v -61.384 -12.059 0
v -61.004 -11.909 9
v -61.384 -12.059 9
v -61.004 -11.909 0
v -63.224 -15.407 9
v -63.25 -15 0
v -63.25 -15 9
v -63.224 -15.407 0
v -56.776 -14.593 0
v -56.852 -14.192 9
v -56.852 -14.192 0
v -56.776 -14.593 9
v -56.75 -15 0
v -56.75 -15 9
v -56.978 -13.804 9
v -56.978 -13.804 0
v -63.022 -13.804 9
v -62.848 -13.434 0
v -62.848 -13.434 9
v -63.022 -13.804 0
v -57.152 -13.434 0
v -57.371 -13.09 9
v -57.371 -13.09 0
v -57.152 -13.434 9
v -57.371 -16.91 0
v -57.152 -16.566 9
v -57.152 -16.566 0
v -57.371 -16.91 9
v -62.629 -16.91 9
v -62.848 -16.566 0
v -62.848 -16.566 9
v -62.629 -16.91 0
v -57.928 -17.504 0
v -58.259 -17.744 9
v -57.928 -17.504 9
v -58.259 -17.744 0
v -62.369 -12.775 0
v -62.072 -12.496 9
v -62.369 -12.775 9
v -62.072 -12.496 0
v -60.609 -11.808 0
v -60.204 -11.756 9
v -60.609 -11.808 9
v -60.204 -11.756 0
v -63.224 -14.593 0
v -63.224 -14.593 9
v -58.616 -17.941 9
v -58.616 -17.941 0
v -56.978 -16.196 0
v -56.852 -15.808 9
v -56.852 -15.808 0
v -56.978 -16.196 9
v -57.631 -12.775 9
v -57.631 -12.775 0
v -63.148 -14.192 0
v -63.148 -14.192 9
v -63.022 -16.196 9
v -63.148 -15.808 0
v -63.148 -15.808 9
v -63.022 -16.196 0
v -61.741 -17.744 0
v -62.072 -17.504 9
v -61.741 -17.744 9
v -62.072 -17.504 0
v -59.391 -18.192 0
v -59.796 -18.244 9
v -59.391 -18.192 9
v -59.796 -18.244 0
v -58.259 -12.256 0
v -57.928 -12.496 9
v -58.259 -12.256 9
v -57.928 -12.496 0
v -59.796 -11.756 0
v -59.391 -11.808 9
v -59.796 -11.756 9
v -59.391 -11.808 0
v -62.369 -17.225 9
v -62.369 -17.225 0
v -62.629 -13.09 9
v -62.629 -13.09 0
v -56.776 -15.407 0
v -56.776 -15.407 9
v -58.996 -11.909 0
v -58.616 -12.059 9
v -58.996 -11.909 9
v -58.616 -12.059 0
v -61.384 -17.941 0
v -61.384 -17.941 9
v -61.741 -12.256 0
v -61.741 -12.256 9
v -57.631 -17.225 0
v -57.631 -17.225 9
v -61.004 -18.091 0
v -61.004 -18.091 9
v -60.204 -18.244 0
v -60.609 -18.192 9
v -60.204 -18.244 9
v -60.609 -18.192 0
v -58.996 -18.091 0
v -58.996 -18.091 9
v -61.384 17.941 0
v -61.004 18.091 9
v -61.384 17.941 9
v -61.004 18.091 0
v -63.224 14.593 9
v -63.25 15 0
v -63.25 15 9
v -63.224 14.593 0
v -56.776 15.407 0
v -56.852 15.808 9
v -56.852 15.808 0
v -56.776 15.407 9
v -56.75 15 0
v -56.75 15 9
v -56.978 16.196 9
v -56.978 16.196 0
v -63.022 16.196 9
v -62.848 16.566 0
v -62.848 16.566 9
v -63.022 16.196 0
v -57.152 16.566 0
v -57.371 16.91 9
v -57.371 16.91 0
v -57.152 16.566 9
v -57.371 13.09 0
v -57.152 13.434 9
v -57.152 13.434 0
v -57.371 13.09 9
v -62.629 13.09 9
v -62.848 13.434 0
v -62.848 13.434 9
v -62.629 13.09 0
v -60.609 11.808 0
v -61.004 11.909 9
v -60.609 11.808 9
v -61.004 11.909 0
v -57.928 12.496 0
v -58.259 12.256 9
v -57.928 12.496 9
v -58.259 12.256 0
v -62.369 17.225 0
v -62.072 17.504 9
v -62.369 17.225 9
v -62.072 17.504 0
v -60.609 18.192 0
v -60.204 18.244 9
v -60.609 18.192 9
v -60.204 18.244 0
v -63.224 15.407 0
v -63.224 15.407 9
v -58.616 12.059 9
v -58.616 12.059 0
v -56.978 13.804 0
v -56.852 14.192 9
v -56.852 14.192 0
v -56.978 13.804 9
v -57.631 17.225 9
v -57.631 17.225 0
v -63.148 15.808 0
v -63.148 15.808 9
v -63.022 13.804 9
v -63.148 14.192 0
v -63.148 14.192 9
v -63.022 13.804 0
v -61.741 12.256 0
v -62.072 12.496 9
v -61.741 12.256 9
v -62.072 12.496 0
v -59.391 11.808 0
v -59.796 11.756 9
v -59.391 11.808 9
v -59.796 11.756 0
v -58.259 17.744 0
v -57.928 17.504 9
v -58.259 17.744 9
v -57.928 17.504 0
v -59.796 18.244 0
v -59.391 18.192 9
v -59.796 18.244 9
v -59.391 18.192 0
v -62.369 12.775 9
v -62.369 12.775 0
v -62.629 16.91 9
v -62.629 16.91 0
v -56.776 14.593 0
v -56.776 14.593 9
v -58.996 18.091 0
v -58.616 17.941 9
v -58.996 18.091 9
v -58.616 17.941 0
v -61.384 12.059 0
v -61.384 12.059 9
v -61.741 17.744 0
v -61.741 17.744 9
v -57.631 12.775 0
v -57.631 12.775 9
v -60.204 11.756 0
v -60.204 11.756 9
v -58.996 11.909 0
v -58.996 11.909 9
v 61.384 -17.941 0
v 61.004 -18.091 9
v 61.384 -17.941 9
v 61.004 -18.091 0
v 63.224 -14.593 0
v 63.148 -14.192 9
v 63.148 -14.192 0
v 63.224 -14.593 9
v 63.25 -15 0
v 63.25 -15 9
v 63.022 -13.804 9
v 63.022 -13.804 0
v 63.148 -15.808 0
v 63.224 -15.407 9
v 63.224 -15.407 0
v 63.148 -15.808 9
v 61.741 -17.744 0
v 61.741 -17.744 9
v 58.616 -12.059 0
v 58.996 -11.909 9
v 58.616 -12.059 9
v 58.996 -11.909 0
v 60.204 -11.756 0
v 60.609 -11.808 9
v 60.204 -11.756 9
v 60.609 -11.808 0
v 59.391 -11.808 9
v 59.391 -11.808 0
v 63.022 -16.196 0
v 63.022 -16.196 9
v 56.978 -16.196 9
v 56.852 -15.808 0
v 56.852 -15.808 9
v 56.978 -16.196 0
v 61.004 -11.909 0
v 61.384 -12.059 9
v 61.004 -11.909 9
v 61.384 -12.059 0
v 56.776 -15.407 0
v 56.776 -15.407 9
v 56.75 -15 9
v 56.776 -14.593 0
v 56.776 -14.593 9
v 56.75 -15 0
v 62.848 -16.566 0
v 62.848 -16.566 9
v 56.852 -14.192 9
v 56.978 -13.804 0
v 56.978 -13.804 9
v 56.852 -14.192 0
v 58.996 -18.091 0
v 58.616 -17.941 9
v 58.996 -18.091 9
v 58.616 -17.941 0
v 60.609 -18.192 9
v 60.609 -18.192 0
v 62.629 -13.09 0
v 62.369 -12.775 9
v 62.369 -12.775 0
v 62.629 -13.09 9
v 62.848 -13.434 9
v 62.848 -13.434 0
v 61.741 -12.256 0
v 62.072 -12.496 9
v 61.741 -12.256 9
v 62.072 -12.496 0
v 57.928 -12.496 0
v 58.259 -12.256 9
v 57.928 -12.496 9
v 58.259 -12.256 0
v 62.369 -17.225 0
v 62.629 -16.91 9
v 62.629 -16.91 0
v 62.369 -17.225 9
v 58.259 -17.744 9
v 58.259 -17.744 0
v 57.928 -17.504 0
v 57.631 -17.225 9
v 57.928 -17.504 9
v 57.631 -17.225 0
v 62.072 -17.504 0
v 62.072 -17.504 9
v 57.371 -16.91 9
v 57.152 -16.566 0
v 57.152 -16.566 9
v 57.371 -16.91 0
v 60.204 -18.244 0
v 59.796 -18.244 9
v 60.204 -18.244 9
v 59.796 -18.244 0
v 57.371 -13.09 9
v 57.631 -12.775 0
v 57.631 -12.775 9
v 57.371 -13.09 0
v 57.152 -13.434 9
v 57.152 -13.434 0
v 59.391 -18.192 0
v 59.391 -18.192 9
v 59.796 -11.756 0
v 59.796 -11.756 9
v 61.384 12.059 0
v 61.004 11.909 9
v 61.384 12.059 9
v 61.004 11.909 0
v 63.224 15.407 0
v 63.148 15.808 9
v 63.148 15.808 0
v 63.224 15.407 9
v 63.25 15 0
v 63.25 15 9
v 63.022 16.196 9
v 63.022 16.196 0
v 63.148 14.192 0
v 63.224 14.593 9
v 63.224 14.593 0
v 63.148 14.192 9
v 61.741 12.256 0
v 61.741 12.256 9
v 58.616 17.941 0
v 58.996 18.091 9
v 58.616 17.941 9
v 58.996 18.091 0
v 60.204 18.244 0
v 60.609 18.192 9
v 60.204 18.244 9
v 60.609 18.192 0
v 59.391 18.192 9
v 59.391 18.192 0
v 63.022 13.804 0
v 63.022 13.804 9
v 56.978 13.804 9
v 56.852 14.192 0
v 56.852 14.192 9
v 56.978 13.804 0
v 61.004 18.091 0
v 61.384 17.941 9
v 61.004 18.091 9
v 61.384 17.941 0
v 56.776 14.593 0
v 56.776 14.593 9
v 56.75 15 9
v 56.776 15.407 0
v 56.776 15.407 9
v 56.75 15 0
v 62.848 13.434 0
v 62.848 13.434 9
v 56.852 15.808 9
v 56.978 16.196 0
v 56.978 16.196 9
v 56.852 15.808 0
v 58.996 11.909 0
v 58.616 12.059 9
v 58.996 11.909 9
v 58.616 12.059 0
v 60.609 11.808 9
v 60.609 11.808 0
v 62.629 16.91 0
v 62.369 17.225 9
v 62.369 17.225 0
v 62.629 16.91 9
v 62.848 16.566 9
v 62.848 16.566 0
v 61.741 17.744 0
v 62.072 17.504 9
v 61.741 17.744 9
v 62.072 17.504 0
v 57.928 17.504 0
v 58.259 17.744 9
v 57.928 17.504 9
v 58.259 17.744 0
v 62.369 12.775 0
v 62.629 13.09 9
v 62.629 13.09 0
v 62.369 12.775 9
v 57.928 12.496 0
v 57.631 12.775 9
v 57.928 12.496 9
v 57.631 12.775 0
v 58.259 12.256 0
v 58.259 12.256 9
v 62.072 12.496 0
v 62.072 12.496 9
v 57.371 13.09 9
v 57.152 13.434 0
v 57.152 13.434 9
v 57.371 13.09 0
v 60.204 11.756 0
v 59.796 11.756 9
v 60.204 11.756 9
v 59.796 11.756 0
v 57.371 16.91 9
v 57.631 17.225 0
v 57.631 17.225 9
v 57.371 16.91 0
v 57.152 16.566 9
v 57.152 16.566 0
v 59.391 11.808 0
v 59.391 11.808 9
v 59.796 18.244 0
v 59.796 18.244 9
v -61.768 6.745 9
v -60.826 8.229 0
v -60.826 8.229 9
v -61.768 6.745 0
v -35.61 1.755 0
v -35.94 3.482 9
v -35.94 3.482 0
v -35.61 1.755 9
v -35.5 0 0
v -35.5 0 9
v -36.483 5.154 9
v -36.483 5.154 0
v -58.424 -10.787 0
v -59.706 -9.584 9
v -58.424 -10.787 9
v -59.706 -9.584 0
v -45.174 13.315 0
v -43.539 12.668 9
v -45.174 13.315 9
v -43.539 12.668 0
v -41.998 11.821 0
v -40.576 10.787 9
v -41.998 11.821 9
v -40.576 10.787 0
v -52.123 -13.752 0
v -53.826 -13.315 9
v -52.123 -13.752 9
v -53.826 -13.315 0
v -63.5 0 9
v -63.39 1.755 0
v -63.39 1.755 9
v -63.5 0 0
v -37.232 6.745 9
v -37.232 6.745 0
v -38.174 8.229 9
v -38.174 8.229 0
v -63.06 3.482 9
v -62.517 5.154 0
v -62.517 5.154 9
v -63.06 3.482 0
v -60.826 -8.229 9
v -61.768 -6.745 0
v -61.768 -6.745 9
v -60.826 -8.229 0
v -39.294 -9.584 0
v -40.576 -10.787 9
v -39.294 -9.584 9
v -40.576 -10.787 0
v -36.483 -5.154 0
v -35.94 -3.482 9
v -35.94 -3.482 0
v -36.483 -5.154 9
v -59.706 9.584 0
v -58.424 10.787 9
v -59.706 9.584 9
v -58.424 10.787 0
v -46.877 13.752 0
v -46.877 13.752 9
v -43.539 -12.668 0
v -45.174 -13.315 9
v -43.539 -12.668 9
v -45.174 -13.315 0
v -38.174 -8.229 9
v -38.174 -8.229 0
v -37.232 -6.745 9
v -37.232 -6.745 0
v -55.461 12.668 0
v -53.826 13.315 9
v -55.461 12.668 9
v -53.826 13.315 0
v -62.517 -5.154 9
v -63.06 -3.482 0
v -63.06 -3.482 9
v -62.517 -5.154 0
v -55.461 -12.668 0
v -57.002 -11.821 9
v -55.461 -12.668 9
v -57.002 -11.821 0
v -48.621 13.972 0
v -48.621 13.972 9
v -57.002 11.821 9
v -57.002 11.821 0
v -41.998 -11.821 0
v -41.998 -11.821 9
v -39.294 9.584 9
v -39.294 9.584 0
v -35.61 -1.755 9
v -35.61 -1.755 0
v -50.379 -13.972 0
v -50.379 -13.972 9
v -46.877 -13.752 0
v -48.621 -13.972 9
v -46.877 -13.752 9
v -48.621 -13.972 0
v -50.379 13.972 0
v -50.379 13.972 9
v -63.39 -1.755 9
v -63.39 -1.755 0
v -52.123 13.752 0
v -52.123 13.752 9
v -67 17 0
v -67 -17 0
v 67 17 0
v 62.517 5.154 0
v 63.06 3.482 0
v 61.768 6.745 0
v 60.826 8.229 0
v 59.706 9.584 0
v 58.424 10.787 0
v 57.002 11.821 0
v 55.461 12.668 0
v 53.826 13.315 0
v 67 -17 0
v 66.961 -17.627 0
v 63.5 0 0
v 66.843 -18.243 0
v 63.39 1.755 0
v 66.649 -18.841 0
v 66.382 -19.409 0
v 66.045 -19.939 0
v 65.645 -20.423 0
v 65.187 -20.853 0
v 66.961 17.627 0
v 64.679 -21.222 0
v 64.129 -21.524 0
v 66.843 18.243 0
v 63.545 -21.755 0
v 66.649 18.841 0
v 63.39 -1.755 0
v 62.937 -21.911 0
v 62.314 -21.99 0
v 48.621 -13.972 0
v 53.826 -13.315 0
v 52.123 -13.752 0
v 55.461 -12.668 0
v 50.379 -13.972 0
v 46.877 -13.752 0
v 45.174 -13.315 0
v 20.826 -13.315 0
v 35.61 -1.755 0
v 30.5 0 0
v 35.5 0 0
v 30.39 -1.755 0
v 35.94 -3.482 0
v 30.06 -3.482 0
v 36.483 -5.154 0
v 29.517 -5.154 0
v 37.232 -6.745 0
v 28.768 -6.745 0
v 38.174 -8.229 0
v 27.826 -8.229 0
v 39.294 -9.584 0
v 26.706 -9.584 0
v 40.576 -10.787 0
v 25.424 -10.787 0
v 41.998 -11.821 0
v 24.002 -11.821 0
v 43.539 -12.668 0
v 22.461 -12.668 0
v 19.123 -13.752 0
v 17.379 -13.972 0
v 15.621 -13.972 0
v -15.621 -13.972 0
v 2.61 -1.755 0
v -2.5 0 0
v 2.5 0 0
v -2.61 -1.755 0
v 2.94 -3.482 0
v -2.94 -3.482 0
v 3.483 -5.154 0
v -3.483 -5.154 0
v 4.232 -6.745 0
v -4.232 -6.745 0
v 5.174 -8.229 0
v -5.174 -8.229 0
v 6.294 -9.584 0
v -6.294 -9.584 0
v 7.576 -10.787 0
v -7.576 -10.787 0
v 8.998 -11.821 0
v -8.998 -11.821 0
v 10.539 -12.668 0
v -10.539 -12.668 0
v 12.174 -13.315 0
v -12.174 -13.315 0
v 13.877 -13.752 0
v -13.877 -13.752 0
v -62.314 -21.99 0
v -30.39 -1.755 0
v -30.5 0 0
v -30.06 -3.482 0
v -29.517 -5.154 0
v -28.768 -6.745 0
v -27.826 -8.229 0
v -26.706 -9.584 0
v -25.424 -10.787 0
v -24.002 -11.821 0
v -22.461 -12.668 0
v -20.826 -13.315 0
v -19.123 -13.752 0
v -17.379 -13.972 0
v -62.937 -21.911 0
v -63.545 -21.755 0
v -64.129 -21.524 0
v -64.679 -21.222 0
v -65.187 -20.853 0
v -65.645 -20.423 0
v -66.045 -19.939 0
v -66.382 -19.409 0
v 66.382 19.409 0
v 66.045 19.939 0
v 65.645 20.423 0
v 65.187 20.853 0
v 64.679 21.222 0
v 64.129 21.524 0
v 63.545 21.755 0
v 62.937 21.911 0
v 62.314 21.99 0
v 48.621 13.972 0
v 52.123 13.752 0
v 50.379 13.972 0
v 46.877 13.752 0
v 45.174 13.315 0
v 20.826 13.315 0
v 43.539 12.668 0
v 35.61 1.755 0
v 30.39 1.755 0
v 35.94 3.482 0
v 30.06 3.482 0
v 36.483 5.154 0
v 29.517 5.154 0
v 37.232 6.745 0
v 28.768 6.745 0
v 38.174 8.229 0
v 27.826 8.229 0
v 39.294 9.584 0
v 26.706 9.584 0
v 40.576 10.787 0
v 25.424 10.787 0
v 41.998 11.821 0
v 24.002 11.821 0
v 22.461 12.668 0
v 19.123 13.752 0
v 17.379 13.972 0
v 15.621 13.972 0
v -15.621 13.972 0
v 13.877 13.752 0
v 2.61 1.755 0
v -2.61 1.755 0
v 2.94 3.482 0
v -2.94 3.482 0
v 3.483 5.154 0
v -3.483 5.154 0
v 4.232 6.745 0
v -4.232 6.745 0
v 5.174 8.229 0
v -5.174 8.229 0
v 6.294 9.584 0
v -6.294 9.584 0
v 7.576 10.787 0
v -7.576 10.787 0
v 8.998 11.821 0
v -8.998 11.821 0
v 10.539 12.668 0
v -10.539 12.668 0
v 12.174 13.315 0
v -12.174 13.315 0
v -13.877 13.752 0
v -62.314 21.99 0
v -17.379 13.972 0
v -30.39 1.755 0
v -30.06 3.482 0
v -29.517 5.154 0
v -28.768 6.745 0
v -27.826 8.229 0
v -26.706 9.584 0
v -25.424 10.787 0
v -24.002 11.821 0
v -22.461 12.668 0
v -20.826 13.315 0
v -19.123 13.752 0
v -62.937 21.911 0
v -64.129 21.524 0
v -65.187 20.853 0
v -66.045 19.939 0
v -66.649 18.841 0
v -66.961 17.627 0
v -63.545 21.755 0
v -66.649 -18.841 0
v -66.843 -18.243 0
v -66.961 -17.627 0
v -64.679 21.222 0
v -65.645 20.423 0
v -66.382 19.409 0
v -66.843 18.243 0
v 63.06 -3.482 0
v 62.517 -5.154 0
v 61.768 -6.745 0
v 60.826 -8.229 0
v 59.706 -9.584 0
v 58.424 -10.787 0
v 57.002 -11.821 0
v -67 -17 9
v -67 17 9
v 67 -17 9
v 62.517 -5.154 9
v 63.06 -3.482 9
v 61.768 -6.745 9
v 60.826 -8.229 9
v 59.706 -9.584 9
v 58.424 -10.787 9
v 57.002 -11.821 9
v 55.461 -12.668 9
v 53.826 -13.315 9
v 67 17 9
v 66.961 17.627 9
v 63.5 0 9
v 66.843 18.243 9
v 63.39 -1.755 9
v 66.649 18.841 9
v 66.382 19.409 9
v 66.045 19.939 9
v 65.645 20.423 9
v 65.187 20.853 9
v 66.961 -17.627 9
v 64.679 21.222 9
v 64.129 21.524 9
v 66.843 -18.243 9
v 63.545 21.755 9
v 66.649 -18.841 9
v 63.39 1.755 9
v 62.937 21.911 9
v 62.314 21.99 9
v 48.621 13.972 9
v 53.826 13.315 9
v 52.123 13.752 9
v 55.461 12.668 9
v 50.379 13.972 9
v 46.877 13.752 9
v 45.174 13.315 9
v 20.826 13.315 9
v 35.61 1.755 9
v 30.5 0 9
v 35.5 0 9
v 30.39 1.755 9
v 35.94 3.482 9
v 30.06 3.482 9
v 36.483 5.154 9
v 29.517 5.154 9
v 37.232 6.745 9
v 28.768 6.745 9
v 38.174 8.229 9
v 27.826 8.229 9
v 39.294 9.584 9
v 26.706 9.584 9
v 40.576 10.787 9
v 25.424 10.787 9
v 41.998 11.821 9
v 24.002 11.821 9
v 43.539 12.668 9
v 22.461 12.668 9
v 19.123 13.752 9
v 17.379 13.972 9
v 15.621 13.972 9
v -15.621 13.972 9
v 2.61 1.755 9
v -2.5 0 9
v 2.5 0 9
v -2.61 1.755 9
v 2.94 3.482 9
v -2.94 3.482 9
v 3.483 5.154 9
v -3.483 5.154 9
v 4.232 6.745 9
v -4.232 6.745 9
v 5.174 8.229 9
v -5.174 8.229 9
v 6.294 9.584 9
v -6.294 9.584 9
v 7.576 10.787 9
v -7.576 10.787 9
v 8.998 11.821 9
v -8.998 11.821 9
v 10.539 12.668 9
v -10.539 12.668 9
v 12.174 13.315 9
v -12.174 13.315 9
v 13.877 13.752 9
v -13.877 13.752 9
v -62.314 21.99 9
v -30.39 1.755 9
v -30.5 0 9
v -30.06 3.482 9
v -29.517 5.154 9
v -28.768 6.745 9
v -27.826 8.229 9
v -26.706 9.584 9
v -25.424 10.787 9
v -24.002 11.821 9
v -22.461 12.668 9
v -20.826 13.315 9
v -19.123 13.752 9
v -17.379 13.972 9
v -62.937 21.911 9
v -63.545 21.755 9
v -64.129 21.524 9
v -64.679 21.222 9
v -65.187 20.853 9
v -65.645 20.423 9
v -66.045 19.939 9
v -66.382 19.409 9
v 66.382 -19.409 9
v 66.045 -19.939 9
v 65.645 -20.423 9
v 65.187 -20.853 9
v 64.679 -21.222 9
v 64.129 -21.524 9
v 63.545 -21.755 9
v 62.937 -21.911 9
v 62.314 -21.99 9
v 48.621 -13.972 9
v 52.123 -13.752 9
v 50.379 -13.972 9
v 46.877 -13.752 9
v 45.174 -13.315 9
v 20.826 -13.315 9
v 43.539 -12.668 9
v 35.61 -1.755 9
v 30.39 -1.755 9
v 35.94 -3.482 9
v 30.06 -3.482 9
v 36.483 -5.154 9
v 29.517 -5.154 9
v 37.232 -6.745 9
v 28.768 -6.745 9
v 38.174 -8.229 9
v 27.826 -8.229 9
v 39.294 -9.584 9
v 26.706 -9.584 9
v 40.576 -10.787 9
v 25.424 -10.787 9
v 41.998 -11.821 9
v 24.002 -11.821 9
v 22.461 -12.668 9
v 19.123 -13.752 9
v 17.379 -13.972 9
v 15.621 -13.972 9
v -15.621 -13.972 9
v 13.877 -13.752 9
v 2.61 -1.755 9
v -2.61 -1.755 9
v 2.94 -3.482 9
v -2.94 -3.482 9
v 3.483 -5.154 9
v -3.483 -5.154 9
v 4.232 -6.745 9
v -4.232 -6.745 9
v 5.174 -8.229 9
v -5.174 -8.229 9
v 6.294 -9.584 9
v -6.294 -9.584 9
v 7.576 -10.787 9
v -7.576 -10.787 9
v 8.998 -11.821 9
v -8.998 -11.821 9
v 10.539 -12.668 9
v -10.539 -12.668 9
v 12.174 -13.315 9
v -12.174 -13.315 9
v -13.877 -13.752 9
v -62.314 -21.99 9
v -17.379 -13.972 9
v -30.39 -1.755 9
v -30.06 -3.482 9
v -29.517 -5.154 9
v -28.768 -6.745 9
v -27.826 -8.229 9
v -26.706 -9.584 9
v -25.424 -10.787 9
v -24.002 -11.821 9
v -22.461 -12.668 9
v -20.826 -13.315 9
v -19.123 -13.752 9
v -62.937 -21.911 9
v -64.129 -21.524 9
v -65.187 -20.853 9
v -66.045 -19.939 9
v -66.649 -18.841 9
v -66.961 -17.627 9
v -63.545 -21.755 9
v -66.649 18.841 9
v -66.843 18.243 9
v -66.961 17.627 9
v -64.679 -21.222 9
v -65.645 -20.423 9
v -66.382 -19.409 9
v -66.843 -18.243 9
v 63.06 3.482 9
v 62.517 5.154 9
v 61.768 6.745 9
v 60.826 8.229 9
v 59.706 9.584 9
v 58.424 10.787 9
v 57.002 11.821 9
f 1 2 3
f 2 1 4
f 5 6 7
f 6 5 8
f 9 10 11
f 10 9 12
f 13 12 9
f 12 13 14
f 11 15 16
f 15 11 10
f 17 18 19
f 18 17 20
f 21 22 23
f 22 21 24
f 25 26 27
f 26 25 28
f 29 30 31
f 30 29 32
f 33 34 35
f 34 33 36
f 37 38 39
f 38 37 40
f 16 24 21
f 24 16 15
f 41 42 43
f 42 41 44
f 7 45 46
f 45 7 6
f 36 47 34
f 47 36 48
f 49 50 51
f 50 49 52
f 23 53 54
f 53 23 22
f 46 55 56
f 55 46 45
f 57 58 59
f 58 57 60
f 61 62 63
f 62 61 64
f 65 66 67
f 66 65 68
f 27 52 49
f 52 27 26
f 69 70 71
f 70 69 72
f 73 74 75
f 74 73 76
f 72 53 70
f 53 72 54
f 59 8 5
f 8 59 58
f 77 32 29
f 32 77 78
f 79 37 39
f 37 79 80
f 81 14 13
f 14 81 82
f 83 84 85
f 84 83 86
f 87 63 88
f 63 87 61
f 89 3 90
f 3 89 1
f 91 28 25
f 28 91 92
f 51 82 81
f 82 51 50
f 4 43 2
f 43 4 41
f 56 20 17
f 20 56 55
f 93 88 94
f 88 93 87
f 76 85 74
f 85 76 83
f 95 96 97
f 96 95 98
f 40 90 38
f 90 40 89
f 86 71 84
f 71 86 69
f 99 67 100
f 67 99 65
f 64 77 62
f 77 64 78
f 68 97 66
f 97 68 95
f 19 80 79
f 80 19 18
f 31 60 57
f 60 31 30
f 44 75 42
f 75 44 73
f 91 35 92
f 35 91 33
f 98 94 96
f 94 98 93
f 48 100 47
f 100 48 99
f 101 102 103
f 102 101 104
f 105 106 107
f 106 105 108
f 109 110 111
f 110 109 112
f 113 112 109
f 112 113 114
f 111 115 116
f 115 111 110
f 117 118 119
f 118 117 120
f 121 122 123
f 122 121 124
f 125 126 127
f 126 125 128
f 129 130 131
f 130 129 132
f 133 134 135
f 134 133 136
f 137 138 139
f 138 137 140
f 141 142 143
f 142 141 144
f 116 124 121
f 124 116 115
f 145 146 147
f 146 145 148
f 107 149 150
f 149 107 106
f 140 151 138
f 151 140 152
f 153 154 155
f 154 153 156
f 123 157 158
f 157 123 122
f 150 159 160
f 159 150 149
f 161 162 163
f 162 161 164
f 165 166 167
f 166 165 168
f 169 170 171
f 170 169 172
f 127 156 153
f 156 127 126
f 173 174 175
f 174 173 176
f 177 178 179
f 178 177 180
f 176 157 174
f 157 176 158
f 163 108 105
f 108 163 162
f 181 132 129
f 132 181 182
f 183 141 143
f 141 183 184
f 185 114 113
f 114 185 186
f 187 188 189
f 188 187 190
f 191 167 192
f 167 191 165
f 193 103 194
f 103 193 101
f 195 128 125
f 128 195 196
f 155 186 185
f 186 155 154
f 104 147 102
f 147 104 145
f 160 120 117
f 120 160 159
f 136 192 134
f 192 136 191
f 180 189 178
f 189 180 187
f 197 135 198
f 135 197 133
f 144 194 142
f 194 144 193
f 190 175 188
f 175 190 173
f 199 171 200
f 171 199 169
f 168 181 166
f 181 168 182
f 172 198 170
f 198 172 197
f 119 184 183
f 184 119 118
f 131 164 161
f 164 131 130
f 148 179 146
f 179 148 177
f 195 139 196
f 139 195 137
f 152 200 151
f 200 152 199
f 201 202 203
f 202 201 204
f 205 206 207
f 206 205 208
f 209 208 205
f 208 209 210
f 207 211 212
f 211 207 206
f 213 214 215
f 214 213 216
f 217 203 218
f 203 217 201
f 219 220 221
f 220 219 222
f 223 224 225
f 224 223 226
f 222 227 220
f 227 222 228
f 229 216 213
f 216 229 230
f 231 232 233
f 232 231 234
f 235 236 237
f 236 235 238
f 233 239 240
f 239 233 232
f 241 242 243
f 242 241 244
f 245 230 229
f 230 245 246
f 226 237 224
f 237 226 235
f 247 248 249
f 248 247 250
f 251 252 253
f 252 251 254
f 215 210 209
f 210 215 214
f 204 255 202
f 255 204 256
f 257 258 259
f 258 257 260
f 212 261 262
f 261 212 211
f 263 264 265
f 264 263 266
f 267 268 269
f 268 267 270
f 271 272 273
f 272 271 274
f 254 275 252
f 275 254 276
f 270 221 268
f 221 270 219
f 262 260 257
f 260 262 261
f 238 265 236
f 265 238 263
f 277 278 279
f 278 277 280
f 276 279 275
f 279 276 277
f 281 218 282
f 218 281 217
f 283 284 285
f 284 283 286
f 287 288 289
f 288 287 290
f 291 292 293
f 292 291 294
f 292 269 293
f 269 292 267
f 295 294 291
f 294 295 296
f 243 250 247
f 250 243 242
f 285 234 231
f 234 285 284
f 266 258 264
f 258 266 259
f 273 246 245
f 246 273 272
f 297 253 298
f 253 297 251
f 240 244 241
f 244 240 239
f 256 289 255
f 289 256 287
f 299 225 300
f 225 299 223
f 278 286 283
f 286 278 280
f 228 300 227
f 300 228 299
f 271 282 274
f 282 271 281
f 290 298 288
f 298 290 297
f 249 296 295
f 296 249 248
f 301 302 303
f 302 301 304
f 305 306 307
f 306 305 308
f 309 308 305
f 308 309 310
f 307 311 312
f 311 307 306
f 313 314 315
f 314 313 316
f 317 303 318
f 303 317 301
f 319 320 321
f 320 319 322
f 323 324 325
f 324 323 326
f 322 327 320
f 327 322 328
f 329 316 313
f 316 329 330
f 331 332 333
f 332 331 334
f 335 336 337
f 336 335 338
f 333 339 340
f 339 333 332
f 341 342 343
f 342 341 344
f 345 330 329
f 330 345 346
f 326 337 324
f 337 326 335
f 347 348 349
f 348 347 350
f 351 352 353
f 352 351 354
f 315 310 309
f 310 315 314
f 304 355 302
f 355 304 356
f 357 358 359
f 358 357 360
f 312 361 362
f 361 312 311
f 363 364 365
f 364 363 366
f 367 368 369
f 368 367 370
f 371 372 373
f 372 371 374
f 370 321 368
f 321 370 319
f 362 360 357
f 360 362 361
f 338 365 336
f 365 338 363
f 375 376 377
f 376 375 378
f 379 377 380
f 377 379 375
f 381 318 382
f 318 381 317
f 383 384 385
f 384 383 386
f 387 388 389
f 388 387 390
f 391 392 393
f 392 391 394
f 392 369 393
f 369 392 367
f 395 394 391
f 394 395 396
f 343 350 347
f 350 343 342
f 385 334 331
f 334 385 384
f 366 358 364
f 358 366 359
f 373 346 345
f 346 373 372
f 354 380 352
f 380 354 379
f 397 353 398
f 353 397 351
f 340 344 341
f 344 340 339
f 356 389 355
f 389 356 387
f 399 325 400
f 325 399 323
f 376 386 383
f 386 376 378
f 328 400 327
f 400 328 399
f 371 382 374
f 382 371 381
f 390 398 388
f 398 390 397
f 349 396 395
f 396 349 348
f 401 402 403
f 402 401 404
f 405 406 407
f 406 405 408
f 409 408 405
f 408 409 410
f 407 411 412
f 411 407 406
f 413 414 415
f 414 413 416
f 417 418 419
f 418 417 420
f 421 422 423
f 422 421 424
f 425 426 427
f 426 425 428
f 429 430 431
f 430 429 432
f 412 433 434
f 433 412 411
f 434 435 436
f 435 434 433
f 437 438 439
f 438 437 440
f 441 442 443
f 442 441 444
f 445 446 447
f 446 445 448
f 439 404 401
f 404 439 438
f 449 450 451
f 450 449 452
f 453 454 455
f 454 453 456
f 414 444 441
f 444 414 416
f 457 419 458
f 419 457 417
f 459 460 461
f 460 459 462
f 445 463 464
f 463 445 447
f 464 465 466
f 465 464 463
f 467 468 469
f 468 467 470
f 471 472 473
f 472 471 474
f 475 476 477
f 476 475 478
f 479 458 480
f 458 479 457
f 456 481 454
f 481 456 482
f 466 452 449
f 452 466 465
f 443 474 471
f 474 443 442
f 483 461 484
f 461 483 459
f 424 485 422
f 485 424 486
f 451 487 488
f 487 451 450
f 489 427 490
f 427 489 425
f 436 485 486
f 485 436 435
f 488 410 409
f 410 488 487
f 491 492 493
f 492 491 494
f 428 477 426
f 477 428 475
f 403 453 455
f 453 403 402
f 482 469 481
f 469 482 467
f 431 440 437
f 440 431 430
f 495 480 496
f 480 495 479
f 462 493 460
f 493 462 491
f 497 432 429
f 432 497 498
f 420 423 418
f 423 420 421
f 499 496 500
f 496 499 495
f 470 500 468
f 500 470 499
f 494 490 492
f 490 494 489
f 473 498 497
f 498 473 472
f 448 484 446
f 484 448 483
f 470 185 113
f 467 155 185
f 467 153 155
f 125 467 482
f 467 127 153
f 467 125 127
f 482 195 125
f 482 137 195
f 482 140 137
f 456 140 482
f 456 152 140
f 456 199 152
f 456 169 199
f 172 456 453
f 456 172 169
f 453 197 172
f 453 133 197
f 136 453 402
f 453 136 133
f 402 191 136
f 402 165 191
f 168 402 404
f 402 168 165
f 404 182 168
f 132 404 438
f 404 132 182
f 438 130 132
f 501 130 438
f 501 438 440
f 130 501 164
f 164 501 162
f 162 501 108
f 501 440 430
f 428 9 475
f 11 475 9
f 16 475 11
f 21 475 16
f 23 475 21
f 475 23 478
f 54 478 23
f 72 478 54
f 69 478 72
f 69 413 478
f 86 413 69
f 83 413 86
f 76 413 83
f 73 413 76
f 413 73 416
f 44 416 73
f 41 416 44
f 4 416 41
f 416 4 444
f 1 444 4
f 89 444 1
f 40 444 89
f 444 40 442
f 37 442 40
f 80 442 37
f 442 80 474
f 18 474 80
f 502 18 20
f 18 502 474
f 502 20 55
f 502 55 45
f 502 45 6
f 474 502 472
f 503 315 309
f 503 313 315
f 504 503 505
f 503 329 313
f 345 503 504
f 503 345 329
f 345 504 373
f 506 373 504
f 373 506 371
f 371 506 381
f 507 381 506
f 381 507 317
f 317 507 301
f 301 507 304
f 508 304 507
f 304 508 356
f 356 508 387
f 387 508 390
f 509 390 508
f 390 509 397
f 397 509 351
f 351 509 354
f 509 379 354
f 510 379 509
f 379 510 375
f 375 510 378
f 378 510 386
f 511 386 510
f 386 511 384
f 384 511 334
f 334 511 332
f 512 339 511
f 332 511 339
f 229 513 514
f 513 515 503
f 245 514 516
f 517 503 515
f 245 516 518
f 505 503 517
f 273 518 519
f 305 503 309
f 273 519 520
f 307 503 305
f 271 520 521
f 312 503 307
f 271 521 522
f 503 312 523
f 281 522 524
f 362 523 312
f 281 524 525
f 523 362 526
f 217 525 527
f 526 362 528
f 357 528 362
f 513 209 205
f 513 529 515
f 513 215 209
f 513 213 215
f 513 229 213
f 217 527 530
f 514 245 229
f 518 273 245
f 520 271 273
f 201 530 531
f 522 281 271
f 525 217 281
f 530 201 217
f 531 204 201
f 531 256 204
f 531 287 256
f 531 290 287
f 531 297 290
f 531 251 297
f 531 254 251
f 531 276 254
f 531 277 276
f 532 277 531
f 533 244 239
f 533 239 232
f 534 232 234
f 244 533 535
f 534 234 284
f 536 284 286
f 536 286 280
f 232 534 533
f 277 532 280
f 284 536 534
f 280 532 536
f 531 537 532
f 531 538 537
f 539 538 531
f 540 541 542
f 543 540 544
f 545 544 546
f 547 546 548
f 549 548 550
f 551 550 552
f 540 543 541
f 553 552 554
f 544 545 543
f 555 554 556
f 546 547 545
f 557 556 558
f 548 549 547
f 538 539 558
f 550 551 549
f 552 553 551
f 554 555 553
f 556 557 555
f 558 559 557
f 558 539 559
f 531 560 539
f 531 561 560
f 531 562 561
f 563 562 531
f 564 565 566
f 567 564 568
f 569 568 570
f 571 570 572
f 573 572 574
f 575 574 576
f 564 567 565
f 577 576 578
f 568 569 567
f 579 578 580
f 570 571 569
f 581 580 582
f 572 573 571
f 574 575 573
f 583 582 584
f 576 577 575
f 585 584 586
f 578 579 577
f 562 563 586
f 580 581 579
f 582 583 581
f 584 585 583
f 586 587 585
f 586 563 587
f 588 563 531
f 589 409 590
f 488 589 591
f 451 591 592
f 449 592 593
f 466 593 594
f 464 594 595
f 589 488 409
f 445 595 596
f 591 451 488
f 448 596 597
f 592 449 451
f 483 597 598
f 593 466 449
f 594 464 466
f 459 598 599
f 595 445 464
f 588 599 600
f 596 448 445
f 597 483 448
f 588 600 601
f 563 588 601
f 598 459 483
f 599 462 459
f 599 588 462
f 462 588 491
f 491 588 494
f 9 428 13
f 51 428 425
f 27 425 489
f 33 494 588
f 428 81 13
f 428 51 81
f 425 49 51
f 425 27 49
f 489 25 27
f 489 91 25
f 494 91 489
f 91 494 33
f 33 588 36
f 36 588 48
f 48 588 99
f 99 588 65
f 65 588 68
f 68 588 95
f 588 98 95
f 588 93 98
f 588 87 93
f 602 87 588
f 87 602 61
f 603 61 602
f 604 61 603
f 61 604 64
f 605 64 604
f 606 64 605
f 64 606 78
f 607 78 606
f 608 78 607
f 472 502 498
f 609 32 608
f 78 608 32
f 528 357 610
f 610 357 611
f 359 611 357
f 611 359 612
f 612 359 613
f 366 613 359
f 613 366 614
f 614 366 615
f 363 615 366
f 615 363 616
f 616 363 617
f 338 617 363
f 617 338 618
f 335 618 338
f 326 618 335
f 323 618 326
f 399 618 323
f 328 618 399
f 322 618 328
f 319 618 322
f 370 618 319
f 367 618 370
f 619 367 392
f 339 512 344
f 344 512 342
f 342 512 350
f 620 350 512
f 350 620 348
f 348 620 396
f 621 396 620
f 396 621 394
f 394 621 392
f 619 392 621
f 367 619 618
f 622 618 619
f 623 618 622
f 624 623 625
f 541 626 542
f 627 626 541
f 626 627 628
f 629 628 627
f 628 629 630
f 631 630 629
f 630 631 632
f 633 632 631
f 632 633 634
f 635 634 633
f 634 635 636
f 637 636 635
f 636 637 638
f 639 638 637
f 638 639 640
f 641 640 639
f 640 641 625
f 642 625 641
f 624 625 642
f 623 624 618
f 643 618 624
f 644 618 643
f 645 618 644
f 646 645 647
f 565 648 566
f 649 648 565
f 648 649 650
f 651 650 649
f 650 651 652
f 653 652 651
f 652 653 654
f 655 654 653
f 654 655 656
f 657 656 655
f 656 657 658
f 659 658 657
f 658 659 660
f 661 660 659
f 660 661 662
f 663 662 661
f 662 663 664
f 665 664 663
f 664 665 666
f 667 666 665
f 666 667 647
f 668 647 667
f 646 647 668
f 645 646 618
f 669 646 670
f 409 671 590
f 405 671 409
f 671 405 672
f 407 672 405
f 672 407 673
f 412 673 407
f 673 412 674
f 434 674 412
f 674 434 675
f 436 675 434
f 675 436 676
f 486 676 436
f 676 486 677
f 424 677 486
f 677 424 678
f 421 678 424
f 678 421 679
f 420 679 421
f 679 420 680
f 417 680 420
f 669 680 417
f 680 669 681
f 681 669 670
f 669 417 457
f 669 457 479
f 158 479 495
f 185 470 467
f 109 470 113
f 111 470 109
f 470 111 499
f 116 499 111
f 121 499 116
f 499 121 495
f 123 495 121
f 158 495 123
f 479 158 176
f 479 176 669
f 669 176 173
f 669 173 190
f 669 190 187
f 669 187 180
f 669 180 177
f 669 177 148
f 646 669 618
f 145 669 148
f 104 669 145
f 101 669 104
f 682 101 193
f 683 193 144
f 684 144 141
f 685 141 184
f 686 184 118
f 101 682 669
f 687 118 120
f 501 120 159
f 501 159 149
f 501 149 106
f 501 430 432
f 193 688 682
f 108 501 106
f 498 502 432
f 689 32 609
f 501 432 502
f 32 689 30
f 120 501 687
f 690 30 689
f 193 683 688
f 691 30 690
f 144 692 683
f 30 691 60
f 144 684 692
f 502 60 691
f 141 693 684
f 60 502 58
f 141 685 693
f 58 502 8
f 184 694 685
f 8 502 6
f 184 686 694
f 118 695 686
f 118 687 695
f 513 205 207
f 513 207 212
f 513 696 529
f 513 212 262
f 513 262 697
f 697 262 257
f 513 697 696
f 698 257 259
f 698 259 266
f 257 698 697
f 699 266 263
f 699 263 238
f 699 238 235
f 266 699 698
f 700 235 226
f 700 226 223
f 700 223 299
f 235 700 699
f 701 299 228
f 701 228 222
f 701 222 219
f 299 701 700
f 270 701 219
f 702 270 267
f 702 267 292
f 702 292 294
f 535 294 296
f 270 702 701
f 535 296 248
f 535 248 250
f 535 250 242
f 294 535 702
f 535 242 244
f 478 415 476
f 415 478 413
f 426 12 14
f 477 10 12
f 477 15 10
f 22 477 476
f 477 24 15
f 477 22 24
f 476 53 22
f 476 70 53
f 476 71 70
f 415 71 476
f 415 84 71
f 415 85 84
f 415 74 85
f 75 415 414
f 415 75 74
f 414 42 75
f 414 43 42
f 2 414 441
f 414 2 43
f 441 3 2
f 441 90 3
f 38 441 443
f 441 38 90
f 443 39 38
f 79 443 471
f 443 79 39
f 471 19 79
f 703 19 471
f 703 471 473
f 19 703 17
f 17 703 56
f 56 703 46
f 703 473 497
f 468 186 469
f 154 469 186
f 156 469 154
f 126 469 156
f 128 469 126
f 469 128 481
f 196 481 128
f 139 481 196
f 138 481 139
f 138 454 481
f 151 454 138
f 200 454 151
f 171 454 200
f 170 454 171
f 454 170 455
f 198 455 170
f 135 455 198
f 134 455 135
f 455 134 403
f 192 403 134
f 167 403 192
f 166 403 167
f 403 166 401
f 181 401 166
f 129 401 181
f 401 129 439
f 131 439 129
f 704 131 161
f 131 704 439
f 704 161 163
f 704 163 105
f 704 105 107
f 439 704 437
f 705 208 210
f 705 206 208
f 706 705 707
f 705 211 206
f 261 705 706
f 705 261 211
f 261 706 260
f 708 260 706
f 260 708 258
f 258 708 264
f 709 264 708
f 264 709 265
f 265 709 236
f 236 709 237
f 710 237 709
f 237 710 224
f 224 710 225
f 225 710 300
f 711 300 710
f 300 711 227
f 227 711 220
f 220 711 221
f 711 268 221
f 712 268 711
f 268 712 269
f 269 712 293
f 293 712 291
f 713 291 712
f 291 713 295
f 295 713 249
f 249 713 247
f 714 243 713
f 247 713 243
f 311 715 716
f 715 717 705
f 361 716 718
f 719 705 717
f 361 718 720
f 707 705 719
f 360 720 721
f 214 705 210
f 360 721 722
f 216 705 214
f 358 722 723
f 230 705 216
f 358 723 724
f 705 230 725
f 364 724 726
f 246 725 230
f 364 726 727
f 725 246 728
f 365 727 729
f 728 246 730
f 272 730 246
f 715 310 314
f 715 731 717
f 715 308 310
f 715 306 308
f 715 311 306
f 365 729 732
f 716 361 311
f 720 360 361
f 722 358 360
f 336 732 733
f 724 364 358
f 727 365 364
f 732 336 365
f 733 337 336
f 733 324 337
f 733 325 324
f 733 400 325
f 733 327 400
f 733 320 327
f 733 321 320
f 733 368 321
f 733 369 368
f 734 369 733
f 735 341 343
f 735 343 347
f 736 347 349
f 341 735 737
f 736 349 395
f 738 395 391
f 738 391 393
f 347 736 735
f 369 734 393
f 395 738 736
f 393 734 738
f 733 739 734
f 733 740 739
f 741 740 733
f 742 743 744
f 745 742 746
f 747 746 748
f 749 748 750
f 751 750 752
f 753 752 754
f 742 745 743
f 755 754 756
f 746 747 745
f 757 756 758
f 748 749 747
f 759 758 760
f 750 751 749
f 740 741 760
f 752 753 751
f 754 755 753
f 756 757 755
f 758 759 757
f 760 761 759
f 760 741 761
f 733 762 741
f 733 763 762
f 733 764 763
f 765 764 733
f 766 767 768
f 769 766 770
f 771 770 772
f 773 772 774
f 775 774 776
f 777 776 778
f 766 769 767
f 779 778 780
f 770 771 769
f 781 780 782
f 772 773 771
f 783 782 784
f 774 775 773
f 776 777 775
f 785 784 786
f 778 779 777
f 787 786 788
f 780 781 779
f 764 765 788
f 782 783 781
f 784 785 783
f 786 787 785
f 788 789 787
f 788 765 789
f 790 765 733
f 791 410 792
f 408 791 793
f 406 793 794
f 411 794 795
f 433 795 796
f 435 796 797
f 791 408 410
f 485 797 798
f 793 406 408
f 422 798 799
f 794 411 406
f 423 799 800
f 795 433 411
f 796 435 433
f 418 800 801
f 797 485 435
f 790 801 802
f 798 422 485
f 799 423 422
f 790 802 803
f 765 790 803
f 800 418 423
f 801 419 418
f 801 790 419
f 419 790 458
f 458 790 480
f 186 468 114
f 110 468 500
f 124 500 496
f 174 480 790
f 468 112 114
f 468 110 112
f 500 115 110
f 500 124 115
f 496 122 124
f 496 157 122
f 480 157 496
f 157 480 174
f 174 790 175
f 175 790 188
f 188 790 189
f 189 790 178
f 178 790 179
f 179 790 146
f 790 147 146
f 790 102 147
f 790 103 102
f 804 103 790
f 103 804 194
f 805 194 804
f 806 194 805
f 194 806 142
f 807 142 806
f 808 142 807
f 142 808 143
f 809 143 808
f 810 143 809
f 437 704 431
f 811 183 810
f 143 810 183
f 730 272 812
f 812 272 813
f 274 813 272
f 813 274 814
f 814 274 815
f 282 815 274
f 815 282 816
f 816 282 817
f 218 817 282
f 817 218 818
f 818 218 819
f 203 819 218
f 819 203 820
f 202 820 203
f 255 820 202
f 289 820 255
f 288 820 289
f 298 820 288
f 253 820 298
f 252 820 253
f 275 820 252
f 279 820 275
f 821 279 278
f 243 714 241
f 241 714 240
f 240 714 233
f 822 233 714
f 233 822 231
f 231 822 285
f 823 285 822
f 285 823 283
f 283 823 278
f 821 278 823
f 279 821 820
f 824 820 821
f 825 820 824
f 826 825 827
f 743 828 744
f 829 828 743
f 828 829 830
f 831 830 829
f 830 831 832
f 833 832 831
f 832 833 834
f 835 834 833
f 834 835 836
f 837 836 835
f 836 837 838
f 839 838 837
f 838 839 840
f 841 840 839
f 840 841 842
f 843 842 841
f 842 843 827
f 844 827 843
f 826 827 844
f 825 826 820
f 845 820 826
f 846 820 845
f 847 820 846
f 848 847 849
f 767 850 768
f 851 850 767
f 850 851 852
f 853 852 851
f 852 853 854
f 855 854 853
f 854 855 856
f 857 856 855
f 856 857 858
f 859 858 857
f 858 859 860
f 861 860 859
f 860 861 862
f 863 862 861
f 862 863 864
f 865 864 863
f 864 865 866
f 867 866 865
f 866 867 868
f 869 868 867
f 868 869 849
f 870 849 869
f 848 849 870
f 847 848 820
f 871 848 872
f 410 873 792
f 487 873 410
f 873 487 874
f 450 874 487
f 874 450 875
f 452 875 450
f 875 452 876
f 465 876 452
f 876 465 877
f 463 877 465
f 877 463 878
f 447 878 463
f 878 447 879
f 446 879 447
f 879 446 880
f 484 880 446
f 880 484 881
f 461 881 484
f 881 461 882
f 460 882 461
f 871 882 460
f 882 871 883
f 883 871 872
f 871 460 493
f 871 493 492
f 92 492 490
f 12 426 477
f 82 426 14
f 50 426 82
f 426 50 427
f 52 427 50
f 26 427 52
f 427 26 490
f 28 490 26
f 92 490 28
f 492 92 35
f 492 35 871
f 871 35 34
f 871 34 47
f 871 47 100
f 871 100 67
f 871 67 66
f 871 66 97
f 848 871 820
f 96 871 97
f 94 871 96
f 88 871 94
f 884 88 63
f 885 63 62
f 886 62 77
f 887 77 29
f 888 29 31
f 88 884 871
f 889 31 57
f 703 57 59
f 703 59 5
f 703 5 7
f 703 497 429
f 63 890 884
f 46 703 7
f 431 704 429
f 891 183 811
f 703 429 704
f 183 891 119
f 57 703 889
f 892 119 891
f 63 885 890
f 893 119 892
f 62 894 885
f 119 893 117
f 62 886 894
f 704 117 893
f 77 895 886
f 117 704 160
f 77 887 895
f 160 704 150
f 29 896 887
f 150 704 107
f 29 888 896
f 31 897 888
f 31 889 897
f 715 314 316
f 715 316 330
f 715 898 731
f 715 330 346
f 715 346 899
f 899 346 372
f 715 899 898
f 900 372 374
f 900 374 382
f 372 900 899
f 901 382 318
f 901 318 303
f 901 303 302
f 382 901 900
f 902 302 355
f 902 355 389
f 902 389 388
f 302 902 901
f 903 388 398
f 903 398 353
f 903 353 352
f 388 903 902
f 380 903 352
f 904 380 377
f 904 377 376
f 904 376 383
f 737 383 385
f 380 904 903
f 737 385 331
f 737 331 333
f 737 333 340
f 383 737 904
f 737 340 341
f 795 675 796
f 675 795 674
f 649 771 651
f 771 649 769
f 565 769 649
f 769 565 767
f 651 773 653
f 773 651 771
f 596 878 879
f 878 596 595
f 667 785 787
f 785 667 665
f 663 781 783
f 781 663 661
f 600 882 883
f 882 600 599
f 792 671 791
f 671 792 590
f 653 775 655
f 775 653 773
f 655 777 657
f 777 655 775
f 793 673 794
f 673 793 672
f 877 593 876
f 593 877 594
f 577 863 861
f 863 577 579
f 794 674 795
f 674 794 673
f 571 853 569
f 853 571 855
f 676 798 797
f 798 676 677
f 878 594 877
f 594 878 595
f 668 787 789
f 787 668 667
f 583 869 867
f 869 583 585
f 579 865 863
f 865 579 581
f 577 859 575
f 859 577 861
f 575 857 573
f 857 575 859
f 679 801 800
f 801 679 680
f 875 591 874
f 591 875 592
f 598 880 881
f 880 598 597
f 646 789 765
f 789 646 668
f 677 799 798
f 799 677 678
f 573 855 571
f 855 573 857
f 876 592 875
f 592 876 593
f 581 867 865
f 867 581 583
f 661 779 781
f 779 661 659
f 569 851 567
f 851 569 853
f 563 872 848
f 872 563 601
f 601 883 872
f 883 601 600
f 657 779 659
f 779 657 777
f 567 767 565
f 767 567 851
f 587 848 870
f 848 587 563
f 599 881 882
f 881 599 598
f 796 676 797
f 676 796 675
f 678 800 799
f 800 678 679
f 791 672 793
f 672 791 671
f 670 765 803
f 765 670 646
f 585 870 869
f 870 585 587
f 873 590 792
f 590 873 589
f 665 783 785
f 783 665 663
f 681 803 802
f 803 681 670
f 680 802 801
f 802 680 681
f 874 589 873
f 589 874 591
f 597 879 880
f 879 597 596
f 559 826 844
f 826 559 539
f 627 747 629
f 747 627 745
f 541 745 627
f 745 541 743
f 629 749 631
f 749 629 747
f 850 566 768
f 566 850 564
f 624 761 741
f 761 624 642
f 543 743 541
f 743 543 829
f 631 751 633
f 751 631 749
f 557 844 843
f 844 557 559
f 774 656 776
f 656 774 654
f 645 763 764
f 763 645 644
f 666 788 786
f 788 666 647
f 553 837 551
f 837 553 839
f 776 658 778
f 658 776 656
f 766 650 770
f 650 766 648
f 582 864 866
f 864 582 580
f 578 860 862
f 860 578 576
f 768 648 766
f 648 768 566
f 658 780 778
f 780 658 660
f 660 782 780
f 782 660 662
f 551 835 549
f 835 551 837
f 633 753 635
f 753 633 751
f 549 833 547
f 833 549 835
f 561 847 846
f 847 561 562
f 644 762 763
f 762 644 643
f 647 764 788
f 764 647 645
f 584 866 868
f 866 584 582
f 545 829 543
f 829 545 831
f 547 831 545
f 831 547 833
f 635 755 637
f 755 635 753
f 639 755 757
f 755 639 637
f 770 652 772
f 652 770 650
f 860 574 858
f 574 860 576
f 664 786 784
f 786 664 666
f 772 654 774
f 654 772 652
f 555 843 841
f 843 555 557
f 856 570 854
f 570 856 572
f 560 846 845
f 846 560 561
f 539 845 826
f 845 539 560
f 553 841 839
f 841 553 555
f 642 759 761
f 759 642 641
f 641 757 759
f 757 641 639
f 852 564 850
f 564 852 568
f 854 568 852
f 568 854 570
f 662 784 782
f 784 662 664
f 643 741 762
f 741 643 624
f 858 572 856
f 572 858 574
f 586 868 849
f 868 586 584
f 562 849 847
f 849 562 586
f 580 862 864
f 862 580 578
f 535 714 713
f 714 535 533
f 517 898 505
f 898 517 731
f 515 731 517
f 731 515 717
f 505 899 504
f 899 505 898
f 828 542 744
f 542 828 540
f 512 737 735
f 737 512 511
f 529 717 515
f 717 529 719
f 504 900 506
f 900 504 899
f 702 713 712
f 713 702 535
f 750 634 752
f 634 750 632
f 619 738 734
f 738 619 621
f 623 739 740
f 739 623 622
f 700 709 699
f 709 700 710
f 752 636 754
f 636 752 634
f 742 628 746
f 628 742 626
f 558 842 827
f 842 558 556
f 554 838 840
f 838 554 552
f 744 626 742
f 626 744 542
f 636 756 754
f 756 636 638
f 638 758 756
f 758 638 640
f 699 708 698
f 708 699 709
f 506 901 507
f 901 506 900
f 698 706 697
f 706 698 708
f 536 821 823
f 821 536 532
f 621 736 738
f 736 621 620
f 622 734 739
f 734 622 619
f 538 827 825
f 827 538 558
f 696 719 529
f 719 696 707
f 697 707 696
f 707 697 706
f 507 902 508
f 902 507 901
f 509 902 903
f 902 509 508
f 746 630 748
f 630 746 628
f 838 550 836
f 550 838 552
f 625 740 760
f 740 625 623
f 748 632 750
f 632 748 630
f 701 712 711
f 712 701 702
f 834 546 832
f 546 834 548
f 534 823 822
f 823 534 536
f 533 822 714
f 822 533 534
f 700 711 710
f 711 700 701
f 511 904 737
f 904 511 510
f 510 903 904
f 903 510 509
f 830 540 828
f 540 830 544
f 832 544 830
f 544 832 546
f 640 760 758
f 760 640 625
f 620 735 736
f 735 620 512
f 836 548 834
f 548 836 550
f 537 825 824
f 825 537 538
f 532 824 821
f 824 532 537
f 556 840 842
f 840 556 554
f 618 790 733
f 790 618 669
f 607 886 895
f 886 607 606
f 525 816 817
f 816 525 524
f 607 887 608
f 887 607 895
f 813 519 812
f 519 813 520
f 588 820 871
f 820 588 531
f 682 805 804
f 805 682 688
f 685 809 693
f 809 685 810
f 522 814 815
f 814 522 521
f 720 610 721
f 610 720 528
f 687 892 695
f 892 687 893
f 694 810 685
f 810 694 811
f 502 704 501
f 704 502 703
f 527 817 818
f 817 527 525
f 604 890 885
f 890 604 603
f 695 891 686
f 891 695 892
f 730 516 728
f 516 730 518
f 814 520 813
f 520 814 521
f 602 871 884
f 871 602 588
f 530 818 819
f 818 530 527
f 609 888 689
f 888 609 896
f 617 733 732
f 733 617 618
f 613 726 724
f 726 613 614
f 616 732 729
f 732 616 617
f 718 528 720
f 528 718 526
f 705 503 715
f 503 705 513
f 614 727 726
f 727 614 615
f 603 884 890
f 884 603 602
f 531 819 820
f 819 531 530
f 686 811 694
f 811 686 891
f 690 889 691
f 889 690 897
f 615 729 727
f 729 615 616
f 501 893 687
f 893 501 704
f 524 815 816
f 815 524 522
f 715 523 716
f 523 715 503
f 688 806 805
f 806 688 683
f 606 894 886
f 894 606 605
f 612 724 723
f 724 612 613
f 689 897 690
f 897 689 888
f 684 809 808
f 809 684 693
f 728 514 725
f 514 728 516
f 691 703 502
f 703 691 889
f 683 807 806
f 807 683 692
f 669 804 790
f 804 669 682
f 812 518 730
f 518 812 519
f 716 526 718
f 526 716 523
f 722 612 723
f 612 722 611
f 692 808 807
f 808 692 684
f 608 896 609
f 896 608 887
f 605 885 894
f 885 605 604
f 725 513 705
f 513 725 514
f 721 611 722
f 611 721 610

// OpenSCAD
$fn = 50;


difference() {
	union() {
		hull() {
			translate(v = [-62.0000000000, 17.0000000000, 0]) {
				cylinder(h = 9, r = 5);
			}
			translate(v = [62.0000000000, 17.0000000000, 0]) {
				cylinder(h = 9, r = 5);
			}
			translate(v = [-62.0000000000, -17.0000000000, 0]) {
				cylinder(h = 9, r = 5);
			}
			translate(v = [62.0000000000, -17.0000000000, 0]) {
				cylinder(h = 9, r = 5);
			}
		}
	}
	union() {
		#translate(v = [-60.0000000000, -15.0000000000, -100.0000000000]) {
			cylinder(h = 200, r = 3.2500000000);
		}
		#translate(v = [-60.0000000000, 15.0000000000, -100.0000000000]) {
			cylinder(h = 200, r = 3.2500000000);
		}
		#translate(v = [60.0000000000, -15.0000000000, -100.0000000000]) {
			cylinder(h = 200, r = 3.2500000000);
		}
		#translate(v = [60.0000000000, 15.0000000000, -100.0000000000]) {
			cylinder(h = 200, r = 3.2500000000);
		}
		#translate(v = [-49.5000000000, 0, 0]) {
			cylinder(h = 9, r = 14.0000000000);
		}
		#translate(v = [-16.5000000000, 0, 0]) {
			cylinder(h = 9, r = 14.0000000000);
		}
		#translate(v = [16.5000000000, 0, 0]) {
			cylinder(h = 9, r = 14.0000000000);
		}
		#translate(v = [49.5000000000, 0, 0]) {
			cylinder(h = 9, r = 14.0000000000);
		}
	}
}
